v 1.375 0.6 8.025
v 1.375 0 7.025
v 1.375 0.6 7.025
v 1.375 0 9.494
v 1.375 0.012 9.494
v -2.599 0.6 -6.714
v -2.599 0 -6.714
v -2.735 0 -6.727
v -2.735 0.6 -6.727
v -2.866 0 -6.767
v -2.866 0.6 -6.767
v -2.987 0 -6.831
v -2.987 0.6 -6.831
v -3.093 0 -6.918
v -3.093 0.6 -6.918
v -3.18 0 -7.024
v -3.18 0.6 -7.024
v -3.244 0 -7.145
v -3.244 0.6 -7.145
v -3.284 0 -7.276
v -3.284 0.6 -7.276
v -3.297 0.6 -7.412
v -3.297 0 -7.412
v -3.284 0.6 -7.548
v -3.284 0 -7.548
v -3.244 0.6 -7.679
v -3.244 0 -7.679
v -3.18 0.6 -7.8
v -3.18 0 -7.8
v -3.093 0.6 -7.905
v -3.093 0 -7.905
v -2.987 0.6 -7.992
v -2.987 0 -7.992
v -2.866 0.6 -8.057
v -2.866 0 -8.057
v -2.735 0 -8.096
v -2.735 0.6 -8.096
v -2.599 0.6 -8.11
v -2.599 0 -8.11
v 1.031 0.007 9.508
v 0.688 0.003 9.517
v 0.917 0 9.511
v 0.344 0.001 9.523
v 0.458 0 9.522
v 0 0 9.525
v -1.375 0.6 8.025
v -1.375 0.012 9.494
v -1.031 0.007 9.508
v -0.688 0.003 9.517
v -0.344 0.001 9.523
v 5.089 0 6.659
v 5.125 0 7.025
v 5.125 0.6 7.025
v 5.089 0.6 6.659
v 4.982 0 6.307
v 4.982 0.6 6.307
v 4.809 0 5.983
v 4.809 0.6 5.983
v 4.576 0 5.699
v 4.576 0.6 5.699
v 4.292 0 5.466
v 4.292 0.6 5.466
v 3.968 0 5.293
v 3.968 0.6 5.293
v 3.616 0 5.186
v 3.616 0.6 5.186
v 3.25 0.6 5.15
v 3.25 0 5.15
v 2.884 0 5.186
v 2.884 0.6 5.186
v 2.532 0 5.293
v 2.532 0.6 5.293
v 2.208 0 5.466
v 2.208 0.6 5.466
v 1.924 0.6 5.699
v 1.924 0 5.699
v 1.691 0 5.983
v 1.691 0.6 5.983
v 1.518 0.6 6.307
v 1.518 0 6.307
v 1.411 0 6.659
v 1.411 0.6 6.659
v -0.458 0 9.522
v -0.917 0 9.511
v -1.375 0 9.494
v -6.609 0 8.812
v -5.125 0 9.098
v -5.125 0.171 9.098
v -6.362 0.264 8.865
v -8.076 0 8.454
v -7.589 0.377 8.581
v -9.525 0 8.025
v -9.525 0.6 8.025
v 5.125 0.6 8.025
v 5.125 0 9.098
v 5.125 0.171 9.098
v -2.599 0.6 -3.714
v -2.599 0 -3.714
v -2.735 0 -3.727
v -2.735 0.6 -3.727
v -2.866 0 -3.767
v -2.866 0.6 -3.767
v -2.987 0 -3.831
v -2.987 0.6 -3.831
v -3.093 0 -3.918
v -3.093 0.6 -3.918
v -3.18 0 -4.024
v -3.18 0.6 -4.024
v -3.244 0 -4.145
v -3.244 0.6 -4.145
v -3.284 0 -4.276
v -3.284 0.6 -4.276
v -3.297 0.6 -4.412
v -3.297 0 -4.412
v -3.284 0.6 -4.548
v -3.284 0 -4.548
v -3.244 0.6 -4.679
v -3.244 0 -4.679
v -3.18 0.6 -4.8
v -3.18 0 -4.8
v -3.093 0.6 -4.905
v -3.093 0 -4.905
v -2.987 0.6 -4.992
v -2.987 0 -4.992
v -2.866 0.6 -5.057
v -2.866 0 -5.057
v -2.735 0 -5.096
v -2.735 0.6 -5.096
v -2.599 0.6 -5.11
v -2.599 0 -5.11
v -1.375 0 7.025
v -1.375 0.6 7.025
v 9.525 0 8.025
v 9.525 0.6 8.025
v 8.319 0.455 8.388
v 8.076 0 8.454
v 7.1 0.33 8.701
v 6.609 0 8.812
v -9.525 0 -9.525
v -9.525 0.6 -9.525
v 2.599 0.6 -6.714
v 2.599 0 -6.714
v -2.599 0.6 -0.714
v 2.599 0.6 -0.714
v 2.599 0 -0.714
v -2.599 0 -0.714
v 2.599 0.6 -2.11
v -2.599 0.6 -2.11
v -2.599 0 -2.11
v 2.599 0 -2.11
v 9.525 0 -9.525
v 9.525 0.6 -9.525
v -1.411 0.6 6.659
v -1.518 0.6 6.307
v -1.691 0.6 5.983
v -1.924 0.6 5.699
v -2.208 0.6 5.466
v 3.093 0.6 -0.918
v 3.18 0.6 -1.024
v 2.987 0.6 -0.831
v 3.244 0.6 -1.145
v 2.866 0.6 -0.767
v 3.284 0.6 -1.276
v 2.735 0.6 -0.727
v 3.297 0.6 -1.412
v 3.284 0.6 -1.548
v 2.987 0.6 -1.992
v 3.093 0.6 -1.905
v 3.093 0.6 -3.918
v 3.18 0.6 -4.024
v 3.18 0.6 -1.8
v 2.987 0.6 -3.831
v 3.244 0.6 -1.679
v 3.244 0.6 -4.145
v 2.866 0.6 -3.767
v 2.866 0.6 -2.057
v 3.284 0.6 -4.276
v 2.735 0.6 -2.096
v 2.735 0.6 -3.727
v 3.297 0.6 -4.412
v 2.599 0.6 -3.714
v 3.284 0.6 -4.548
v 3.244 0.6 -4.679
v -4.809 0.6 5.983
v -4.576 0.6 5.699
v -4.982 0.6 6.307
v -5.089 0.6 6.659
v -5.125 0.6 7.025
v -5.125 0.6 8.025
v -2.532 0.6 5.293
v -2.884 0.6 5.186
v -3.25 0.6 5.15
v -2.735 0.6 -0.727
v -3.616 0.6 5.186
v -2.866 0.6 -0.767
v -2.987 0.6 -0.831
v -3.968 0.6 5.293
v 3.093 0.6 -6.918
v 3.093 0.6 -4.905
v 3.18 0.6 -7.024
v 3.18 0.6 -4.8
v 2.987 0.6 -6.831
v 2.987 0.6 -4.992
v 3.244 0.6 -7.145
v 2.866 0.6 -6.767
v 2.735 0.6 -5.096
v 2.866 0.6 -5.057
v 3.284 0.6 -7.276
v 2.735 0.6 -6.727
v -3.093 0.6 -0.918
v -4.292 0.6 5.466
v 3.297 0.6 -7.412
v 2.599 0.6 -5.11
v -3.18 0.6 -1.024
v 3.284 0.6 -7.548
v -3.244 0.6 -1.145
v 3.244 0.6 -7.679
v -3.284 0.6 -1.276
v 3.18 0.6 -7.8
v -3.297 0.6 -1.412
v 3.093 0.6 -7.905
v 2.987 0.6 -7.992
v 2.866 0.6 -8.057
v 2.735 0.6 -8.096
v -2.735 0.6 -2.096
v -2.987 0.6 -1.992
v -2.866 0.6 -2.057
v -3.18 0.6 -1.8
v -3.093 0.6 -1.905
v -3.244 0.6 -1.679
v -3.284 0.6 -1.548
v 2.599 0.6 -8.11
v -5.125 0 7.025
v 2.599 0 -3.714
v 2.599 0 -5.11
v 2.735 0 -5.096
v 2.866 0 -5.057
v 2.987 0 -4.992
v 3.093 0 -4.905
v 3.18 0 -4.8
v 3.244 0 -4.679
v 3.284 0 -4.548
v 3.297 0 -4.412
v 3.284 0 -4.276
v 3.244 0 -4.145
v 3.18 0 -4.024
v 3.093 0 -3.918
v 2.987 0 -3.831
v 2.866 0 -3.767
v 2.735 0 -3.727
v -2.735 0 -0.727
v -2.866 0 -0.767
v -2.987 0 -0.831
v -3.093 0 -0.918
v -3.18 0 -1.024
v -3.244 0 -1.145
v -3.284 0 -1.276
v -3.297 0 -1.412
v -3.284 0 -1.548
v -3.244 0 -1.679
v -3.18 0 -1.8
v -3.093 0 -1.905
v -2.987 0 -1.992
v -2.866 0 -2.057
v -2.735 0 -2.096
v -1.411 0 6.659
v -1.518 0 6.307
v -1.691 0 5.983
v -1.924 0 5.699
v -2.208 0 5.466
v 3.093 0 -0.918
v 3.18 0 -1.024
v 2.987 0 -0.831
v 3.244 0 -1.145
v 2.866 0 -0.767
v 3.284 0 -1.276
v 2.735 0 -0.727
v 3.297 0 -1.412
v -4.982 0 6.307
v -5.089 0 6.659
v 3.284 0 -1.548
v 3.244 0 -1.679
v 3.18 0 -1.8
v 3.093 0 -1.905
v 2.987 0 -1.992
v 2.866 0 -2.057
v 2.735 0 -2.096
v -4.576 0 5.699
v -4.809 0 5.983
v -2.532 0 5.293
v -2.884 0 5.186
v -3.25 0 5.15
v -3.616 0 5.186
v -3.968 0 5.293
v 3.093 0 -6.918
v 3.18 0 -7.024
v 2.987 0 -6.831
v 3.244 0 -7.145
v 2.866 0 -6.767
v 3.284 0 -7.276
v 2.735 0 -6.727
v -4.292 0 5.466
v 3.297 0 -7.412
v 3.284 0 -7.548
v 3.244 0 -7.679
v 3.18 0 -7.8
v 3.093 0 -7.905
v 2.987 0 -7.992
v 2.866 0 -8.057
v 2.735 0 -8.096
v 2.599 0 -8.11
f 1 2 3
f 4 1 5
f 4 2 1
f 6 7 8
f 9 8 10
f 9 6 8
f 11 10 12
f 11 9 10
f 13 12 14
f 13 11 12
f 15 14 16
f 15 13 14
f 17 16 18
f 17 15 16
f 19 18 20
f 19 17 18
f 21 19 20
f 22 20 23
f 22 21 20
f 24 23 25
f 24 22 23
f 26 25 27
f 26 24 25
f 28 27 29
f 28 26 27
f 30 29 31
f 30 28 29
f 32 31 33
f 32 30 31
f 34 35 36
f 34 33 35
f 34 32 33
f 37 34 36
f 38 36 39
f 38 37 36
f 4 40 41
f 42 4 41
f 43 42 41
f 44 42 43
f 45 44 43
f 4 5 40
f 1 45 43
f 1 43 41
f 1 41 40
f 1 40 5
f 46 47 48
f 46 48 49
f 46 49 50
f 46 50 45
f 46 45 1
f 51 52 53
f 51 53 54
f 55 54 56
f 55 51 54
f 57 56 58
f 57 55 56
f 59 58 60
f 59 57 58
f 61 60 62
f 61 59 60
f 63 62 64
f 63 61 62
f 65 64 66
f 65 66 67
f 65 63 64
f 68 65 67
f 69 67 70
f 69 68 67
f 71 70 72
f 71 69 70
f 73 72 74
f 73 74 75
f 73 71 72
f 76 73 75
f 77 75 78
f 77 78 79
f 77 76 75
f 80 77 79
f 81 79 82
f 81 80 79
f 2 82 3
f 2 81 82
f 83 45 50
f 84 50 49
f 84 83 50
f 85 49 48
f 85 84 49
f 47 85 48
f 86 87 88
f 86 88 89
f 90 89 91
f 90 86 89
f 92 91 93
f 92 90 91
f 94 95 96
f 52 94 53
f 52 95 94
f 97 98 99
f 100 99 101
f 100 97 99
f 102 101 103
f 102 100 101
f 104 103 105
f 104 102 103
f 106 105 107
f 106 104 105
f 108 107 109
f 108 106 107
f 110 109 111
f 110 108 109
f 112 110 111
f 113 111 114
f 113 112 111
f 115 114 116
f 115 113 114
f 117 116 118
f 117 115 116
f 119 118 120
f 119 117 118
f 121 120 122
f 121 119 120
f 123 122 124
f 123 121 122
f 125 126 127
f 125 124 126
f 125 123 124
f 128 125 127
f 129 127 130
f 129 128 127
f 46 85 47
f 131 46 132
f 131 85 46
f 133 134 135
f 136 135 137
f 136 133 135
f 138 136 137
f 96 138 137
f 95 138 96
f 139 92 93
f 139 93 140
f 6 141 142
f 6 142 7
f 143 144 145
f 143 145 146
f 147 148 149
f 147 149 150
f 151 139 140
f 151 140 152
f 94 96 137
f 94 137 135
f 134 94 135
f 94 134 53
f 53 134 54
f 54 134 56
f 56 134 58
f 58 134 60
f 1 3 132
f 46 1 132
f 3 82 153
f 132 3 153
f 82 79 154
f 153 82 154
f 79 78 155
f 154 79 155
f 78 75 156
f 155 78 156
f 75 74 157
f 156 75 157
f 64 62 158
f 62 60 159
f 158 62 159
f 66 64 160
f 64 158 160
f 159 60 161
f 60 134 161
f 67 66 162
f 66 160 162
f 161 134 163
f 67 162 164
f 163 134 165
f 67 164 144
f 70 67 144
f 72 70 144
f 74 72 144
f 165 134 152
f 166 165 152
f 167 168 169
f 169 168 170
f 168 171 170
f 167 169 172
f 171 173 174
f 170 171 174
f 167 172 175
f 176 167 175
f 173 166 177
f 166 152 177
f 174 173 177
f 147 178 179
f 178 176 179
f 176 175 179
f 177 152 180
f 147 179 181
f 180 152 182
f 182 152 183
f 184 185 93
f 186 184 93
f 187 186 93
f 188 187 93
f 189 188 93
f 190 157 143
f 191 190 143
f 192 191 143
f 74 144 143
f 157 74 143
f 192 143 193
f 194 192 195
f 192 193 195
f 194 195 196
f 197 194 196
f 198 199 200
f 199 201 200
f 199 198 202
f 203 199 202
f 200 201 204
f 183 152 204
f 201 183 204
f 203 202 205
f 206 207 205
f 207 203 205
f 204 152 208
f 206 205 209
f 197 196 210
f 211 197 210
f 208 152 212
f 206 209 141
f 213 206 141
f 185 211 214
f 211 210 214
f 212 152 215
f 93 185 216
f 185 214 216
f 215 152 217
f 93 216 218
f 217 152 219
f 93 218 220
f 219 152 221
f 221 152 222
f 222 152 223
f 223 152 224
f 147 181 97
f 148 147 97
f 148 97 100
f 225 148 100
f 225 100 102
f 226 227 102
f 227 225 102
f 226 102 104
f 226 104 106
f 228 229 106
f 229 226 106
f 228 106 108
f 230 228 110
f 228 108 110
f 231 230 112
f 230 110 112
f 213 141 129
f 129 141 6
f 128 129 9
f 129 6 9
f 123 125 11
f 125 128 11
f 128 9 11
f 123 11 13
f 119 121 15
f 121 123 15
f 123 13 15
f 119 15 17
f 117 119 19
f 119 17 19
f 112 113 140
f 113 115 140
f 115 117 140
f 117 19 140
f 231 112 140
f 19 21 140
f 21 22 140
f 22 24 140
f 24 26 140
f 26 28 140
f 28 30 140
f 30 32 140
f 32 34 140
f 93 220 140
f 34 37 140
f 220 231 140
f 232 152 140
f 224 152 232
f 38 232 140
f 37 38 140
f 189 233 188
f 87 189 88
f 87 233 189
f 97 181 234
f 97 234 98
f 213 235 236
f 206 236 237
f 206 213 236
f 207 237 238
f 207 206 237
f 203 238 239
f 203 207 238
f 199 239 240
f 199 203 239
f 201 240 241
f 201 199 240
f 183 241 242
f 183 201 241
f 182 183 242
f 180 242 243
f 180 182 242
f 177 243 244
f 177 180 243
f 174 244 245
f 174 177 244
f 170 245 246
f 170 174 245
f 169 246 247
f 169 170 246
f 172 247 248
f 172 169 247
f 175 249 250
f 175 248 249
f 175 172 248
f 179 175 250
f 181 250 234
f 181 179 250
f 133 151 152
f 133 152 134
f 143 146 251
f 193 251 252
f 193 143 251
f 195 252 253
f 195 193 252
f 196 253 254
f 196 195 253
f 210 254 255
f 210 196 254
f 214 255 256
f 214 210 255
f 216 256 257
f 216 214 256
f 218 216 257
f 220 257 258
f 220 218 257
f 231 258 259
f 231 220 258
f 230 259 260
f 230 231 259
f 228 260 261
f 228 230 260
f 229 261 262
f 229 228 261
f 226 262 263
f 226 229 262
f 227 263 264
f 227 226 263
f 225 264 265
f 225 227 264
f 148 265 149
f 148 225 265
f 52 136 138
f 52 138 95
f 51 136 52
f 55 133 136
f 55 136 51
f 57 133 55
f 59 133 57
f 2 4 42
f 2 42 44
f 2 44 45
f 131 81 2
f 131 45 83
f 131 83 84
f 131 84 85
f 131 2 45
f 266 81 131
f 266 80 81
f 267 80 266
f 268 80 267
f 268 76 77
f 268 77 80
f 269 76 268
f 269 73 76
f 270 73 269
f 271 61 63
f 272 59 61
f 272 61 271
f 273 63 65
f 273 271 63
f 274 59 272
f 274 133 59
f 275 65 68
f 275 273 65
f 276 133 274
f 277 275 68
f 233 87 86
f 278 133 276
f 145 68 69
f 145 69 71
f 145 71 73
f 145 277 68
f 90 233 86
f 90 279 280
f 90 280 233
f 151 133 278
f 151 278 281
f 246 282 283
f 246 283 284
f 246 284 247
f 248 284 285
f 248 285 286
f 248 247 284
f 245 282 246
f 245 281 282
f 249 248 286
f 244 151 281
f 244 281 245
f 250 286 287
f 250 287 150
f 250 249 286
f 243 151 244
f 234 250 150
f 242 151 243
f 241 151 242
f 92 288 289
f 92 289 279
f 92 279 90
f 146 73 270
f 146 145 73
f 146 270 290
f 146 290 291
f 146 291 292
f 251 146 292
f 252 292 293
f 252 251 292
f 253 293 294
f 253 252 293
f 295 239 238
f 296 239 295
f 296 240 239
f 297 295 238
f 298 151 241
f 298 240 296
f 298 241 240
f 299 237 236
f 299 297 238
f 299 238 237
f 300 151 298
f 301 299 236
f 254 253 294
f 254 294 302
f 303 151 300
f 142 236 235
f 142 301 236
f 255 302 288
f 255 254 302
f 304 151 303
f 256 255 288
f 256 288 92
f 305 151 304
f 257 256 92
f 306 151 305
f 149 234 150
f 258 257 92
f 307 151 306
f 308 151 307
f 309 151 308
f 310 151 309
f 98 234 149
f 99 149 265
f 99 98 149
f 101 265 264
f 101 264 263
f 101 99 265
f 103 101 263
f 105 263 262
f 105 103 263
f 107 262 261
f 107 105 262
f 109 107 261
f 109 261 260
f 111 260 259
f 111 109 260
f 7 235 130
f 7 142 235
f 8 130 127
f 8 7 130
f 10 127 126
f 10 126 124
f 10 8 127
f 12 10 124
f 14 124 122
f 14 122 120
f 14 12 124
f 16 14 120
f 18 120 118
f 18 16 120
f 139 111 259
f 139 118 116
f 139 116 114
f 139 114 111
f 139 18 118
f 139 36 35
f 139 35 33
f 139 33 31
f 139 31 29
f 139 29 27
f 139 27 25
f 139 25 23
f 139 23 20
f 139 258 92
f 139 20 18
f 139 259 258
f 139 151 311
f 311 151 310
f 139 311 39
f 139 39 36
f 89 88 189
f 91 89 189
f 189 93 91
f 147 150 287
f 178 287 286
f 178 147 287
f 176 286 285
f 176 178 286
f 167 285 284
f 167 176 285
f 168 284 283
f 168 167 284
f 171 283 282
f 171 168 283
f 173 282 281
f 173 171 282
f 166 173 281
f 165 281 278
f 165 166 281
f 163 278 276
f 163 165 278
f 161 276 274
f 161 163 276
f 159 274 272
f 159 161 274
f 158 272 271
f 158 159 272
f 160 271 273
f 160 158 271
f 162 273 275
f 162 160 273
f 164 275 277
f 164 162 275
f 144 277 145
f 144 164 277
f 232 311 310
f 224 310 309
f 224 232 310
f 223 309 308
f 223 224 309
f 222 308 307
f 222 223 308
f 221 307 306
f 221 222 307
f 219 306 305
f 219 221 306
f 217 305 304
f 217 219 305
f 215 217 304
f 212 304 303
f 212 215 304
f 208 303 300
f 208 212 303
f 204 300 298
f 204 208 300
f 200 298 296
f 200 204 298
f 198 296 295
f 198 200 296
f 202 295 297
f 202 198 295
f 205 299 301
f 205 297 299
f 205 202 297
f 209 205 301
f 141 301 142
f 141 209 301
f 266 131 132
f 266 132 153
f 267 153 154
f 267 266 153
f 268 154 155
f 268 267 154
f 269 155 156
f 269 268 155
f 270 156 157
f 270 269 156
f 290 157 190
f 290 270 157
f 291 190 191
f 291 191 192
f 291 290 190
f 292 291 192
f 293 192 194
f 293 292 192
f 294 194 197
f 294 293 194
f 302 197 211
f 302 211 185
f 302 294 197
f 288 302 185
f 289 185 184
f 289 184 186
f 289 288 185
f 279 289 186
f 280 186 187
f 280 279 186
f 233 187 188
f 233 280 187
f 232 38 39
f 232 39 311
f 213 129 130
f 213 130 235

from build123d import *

# Parameters (mm, degrees)
BOSS_EXTRUDE1_DEPTH     = 0.6
CUT_EXTRUDE1_DEPTH      = 14.483740208
CUT_EXTRUDE1_DEPTH_BACK = 14.483740208
CUT_EXTRUDE2_REACH      = 15.484


with BuildPart() as part:
    # Sketch1 → Boss-Extrude1 (new body)
    with BuildSketch(Plane(origin=(0, 0, 0), x_dir=(1, 0, 0), z_dir=(0, 1, 0))):
        with BuildLine():
            Line((-5.125, -7.025), (-5.125, -9.098312567))
            ThreePointArc((-5.125, -9.098312567), (-7.344632392, -8.642138452), (-9.525, -8.025))
            Line((-9.525, -8.025), (-9.525, 9.525))
            Line((-9.525, 9.525), (9.525, 9.525))
            Line((9.525, 9.525), (9.525, -8.025))
            ThreePointArc((9.525, -8.025), (7.344632392, -8.642138452), (5.125, -9.098312567))
            Line((5.125, -9.098312567), (5.125, -7.025))
            ThreePointArc((5.125, -7.025), (3.25, -5.15), (1.375, -7.025))
            Line((1.375, -7.025), (1.375, -9.494483029))
            ThreePointArc((1.375, -9.494483029), (0, -9.525), (-1.375, -9.494483029))
            Line((-1.375, -9.494483029), (-1.375, -7.025))
            ThreePointArc((-1.375, -7.025), (-3.25, -5.15), (-5.125, -7.025))
        make_face()
    extrude(amount=BOSS_EXTRUDE1_DEPTH)

    # Sketch2 → Cut-Extrude1 (cut, two sides: drawn at the far end of the back side and taken through both)
    with BuildSketch(Plane(origin=(0, 0, 0), x_dir=(0, 0, -1), z_dir=(1, 0, 0)).offset(-CUT_EXTRUDE1_DEPTH_BACK)):
        Polygon((-9.525, 0), (-8.025, 0.6), (-9.525, 0.6), align=None)
    extrude(amount=CUT_EXTRUDE1_DEPTH + CUT_EXTRUDE1_DEPTH_BACK, mode=Mode.SUBTRACT)

    # Sketch3 → Cut-Extrude2 (cut, up to next)
    with BuildSketch(Plane(origin=(0, 0.6, 0), x_dir=(1, 0, 0), z_dir=(0, 1, 0)), mode=Mode.PRIVATE) as cut_extrude2_sk1:
        with BuildLine():
            Line((2.5992936, 6.713604042), (-2.5992936, 6.713604042))
            ThreePointArc((-2.5992936, 6.713604042), (-3.297389596, 7.411700037), (-2.5992936, 8.109796033))
            Line((-2.5992936, 8.109796033), (2.5992936, 8.109796033))
            ThreePointArc((2.5992936, 8.109796033), (3.297389596, 7.411700037), (2.5992936, 6.713604042))
        make_face()
    cut_extrude2_tool1 = extrude(cut_extrude2_sk1.sketch, amount=-CUT_EXTRUDE2_REACH, mode=Mode.PRIVATE) & part.part
    # Sketch3 → Cut-Extrude2 (cut, up to next)
    with BuildSketch(Plane(origin=(0, 0.6, 0), x_dir=(1, 0, 0), z_dir=(0, 1, 0)), mode=Mode.PRIVATE) as cut_extrude2_sk2:
        with BuildLine():
            Line((2.5992936, 3.713604042), (-2.5992936, 3.713604042))
            ThreePointArc((-2.5992936, 3.713604042), (-3.297389596, 4.411700037), (-2.5992936, 5.109796033))
            Line((-2.5992936, 5.109796033), (2.5992936, 5.109796033))
            ThreePointArc((2.5992936, 5.109796033), (3.297389596, 4.411700037), (2.5992936, 3.713604042))
        make_face()
    cut_extrude2_tool2 = extrude(cut_extrude2_sk2.sketch, amount=-CUT_EXTRUDE2_REACH, mode=Mode.PRIVATE) & part.part
    # Sketch3 → Cut-Extrude2 (cut, up to next)
    with BuildSketch(Plane(origin=(0, 0.6, 0), x_dir=(1, 0, 0), z_dir=(0, 1, 0)), mode=Mode.PRIVATE) as cut_extrude2_sk3:
        with BuildLine():
            Line((2.5992936, 0.713604042), (-2.5992936, 0.713604042))
            ThreePointArc((-2.5992936, 0.713604042), (-3.297389596, 1.411700037), (-2.5992936, 2.109796033))
            Line((-2.5992936, 2.109796033), (2.5992936, 2.109796033))
            ThreePointArc((2.5992936, 2.109796033), (3.297389596, 1.411700037), (2.5992936, 0.713604042))
        make_face()
    cut_extrude2_tool3 = extrude(cut_extrude2_sk3.sketch, amount=-CUT_EXTRUDE2_REACH, mode=Mode.PRIVATE) & part.part
    add(cut_extrude2_tool1.solids().sort_by_distance((0, 0.6, -7.4117))[0], mode=Mode.SUBTRACT)
    add(cut_extrude2_tool2.solids().sort_by_distance((0, 0.6, -4.4117))[0], mode=Mode.SUBTRACT)
    add(cut_extrude2_tool3.solids().sort_by_distance((0, 0.6, -1.4117))[0], mode=Mode.SUBTRACT)


solid = part.part
